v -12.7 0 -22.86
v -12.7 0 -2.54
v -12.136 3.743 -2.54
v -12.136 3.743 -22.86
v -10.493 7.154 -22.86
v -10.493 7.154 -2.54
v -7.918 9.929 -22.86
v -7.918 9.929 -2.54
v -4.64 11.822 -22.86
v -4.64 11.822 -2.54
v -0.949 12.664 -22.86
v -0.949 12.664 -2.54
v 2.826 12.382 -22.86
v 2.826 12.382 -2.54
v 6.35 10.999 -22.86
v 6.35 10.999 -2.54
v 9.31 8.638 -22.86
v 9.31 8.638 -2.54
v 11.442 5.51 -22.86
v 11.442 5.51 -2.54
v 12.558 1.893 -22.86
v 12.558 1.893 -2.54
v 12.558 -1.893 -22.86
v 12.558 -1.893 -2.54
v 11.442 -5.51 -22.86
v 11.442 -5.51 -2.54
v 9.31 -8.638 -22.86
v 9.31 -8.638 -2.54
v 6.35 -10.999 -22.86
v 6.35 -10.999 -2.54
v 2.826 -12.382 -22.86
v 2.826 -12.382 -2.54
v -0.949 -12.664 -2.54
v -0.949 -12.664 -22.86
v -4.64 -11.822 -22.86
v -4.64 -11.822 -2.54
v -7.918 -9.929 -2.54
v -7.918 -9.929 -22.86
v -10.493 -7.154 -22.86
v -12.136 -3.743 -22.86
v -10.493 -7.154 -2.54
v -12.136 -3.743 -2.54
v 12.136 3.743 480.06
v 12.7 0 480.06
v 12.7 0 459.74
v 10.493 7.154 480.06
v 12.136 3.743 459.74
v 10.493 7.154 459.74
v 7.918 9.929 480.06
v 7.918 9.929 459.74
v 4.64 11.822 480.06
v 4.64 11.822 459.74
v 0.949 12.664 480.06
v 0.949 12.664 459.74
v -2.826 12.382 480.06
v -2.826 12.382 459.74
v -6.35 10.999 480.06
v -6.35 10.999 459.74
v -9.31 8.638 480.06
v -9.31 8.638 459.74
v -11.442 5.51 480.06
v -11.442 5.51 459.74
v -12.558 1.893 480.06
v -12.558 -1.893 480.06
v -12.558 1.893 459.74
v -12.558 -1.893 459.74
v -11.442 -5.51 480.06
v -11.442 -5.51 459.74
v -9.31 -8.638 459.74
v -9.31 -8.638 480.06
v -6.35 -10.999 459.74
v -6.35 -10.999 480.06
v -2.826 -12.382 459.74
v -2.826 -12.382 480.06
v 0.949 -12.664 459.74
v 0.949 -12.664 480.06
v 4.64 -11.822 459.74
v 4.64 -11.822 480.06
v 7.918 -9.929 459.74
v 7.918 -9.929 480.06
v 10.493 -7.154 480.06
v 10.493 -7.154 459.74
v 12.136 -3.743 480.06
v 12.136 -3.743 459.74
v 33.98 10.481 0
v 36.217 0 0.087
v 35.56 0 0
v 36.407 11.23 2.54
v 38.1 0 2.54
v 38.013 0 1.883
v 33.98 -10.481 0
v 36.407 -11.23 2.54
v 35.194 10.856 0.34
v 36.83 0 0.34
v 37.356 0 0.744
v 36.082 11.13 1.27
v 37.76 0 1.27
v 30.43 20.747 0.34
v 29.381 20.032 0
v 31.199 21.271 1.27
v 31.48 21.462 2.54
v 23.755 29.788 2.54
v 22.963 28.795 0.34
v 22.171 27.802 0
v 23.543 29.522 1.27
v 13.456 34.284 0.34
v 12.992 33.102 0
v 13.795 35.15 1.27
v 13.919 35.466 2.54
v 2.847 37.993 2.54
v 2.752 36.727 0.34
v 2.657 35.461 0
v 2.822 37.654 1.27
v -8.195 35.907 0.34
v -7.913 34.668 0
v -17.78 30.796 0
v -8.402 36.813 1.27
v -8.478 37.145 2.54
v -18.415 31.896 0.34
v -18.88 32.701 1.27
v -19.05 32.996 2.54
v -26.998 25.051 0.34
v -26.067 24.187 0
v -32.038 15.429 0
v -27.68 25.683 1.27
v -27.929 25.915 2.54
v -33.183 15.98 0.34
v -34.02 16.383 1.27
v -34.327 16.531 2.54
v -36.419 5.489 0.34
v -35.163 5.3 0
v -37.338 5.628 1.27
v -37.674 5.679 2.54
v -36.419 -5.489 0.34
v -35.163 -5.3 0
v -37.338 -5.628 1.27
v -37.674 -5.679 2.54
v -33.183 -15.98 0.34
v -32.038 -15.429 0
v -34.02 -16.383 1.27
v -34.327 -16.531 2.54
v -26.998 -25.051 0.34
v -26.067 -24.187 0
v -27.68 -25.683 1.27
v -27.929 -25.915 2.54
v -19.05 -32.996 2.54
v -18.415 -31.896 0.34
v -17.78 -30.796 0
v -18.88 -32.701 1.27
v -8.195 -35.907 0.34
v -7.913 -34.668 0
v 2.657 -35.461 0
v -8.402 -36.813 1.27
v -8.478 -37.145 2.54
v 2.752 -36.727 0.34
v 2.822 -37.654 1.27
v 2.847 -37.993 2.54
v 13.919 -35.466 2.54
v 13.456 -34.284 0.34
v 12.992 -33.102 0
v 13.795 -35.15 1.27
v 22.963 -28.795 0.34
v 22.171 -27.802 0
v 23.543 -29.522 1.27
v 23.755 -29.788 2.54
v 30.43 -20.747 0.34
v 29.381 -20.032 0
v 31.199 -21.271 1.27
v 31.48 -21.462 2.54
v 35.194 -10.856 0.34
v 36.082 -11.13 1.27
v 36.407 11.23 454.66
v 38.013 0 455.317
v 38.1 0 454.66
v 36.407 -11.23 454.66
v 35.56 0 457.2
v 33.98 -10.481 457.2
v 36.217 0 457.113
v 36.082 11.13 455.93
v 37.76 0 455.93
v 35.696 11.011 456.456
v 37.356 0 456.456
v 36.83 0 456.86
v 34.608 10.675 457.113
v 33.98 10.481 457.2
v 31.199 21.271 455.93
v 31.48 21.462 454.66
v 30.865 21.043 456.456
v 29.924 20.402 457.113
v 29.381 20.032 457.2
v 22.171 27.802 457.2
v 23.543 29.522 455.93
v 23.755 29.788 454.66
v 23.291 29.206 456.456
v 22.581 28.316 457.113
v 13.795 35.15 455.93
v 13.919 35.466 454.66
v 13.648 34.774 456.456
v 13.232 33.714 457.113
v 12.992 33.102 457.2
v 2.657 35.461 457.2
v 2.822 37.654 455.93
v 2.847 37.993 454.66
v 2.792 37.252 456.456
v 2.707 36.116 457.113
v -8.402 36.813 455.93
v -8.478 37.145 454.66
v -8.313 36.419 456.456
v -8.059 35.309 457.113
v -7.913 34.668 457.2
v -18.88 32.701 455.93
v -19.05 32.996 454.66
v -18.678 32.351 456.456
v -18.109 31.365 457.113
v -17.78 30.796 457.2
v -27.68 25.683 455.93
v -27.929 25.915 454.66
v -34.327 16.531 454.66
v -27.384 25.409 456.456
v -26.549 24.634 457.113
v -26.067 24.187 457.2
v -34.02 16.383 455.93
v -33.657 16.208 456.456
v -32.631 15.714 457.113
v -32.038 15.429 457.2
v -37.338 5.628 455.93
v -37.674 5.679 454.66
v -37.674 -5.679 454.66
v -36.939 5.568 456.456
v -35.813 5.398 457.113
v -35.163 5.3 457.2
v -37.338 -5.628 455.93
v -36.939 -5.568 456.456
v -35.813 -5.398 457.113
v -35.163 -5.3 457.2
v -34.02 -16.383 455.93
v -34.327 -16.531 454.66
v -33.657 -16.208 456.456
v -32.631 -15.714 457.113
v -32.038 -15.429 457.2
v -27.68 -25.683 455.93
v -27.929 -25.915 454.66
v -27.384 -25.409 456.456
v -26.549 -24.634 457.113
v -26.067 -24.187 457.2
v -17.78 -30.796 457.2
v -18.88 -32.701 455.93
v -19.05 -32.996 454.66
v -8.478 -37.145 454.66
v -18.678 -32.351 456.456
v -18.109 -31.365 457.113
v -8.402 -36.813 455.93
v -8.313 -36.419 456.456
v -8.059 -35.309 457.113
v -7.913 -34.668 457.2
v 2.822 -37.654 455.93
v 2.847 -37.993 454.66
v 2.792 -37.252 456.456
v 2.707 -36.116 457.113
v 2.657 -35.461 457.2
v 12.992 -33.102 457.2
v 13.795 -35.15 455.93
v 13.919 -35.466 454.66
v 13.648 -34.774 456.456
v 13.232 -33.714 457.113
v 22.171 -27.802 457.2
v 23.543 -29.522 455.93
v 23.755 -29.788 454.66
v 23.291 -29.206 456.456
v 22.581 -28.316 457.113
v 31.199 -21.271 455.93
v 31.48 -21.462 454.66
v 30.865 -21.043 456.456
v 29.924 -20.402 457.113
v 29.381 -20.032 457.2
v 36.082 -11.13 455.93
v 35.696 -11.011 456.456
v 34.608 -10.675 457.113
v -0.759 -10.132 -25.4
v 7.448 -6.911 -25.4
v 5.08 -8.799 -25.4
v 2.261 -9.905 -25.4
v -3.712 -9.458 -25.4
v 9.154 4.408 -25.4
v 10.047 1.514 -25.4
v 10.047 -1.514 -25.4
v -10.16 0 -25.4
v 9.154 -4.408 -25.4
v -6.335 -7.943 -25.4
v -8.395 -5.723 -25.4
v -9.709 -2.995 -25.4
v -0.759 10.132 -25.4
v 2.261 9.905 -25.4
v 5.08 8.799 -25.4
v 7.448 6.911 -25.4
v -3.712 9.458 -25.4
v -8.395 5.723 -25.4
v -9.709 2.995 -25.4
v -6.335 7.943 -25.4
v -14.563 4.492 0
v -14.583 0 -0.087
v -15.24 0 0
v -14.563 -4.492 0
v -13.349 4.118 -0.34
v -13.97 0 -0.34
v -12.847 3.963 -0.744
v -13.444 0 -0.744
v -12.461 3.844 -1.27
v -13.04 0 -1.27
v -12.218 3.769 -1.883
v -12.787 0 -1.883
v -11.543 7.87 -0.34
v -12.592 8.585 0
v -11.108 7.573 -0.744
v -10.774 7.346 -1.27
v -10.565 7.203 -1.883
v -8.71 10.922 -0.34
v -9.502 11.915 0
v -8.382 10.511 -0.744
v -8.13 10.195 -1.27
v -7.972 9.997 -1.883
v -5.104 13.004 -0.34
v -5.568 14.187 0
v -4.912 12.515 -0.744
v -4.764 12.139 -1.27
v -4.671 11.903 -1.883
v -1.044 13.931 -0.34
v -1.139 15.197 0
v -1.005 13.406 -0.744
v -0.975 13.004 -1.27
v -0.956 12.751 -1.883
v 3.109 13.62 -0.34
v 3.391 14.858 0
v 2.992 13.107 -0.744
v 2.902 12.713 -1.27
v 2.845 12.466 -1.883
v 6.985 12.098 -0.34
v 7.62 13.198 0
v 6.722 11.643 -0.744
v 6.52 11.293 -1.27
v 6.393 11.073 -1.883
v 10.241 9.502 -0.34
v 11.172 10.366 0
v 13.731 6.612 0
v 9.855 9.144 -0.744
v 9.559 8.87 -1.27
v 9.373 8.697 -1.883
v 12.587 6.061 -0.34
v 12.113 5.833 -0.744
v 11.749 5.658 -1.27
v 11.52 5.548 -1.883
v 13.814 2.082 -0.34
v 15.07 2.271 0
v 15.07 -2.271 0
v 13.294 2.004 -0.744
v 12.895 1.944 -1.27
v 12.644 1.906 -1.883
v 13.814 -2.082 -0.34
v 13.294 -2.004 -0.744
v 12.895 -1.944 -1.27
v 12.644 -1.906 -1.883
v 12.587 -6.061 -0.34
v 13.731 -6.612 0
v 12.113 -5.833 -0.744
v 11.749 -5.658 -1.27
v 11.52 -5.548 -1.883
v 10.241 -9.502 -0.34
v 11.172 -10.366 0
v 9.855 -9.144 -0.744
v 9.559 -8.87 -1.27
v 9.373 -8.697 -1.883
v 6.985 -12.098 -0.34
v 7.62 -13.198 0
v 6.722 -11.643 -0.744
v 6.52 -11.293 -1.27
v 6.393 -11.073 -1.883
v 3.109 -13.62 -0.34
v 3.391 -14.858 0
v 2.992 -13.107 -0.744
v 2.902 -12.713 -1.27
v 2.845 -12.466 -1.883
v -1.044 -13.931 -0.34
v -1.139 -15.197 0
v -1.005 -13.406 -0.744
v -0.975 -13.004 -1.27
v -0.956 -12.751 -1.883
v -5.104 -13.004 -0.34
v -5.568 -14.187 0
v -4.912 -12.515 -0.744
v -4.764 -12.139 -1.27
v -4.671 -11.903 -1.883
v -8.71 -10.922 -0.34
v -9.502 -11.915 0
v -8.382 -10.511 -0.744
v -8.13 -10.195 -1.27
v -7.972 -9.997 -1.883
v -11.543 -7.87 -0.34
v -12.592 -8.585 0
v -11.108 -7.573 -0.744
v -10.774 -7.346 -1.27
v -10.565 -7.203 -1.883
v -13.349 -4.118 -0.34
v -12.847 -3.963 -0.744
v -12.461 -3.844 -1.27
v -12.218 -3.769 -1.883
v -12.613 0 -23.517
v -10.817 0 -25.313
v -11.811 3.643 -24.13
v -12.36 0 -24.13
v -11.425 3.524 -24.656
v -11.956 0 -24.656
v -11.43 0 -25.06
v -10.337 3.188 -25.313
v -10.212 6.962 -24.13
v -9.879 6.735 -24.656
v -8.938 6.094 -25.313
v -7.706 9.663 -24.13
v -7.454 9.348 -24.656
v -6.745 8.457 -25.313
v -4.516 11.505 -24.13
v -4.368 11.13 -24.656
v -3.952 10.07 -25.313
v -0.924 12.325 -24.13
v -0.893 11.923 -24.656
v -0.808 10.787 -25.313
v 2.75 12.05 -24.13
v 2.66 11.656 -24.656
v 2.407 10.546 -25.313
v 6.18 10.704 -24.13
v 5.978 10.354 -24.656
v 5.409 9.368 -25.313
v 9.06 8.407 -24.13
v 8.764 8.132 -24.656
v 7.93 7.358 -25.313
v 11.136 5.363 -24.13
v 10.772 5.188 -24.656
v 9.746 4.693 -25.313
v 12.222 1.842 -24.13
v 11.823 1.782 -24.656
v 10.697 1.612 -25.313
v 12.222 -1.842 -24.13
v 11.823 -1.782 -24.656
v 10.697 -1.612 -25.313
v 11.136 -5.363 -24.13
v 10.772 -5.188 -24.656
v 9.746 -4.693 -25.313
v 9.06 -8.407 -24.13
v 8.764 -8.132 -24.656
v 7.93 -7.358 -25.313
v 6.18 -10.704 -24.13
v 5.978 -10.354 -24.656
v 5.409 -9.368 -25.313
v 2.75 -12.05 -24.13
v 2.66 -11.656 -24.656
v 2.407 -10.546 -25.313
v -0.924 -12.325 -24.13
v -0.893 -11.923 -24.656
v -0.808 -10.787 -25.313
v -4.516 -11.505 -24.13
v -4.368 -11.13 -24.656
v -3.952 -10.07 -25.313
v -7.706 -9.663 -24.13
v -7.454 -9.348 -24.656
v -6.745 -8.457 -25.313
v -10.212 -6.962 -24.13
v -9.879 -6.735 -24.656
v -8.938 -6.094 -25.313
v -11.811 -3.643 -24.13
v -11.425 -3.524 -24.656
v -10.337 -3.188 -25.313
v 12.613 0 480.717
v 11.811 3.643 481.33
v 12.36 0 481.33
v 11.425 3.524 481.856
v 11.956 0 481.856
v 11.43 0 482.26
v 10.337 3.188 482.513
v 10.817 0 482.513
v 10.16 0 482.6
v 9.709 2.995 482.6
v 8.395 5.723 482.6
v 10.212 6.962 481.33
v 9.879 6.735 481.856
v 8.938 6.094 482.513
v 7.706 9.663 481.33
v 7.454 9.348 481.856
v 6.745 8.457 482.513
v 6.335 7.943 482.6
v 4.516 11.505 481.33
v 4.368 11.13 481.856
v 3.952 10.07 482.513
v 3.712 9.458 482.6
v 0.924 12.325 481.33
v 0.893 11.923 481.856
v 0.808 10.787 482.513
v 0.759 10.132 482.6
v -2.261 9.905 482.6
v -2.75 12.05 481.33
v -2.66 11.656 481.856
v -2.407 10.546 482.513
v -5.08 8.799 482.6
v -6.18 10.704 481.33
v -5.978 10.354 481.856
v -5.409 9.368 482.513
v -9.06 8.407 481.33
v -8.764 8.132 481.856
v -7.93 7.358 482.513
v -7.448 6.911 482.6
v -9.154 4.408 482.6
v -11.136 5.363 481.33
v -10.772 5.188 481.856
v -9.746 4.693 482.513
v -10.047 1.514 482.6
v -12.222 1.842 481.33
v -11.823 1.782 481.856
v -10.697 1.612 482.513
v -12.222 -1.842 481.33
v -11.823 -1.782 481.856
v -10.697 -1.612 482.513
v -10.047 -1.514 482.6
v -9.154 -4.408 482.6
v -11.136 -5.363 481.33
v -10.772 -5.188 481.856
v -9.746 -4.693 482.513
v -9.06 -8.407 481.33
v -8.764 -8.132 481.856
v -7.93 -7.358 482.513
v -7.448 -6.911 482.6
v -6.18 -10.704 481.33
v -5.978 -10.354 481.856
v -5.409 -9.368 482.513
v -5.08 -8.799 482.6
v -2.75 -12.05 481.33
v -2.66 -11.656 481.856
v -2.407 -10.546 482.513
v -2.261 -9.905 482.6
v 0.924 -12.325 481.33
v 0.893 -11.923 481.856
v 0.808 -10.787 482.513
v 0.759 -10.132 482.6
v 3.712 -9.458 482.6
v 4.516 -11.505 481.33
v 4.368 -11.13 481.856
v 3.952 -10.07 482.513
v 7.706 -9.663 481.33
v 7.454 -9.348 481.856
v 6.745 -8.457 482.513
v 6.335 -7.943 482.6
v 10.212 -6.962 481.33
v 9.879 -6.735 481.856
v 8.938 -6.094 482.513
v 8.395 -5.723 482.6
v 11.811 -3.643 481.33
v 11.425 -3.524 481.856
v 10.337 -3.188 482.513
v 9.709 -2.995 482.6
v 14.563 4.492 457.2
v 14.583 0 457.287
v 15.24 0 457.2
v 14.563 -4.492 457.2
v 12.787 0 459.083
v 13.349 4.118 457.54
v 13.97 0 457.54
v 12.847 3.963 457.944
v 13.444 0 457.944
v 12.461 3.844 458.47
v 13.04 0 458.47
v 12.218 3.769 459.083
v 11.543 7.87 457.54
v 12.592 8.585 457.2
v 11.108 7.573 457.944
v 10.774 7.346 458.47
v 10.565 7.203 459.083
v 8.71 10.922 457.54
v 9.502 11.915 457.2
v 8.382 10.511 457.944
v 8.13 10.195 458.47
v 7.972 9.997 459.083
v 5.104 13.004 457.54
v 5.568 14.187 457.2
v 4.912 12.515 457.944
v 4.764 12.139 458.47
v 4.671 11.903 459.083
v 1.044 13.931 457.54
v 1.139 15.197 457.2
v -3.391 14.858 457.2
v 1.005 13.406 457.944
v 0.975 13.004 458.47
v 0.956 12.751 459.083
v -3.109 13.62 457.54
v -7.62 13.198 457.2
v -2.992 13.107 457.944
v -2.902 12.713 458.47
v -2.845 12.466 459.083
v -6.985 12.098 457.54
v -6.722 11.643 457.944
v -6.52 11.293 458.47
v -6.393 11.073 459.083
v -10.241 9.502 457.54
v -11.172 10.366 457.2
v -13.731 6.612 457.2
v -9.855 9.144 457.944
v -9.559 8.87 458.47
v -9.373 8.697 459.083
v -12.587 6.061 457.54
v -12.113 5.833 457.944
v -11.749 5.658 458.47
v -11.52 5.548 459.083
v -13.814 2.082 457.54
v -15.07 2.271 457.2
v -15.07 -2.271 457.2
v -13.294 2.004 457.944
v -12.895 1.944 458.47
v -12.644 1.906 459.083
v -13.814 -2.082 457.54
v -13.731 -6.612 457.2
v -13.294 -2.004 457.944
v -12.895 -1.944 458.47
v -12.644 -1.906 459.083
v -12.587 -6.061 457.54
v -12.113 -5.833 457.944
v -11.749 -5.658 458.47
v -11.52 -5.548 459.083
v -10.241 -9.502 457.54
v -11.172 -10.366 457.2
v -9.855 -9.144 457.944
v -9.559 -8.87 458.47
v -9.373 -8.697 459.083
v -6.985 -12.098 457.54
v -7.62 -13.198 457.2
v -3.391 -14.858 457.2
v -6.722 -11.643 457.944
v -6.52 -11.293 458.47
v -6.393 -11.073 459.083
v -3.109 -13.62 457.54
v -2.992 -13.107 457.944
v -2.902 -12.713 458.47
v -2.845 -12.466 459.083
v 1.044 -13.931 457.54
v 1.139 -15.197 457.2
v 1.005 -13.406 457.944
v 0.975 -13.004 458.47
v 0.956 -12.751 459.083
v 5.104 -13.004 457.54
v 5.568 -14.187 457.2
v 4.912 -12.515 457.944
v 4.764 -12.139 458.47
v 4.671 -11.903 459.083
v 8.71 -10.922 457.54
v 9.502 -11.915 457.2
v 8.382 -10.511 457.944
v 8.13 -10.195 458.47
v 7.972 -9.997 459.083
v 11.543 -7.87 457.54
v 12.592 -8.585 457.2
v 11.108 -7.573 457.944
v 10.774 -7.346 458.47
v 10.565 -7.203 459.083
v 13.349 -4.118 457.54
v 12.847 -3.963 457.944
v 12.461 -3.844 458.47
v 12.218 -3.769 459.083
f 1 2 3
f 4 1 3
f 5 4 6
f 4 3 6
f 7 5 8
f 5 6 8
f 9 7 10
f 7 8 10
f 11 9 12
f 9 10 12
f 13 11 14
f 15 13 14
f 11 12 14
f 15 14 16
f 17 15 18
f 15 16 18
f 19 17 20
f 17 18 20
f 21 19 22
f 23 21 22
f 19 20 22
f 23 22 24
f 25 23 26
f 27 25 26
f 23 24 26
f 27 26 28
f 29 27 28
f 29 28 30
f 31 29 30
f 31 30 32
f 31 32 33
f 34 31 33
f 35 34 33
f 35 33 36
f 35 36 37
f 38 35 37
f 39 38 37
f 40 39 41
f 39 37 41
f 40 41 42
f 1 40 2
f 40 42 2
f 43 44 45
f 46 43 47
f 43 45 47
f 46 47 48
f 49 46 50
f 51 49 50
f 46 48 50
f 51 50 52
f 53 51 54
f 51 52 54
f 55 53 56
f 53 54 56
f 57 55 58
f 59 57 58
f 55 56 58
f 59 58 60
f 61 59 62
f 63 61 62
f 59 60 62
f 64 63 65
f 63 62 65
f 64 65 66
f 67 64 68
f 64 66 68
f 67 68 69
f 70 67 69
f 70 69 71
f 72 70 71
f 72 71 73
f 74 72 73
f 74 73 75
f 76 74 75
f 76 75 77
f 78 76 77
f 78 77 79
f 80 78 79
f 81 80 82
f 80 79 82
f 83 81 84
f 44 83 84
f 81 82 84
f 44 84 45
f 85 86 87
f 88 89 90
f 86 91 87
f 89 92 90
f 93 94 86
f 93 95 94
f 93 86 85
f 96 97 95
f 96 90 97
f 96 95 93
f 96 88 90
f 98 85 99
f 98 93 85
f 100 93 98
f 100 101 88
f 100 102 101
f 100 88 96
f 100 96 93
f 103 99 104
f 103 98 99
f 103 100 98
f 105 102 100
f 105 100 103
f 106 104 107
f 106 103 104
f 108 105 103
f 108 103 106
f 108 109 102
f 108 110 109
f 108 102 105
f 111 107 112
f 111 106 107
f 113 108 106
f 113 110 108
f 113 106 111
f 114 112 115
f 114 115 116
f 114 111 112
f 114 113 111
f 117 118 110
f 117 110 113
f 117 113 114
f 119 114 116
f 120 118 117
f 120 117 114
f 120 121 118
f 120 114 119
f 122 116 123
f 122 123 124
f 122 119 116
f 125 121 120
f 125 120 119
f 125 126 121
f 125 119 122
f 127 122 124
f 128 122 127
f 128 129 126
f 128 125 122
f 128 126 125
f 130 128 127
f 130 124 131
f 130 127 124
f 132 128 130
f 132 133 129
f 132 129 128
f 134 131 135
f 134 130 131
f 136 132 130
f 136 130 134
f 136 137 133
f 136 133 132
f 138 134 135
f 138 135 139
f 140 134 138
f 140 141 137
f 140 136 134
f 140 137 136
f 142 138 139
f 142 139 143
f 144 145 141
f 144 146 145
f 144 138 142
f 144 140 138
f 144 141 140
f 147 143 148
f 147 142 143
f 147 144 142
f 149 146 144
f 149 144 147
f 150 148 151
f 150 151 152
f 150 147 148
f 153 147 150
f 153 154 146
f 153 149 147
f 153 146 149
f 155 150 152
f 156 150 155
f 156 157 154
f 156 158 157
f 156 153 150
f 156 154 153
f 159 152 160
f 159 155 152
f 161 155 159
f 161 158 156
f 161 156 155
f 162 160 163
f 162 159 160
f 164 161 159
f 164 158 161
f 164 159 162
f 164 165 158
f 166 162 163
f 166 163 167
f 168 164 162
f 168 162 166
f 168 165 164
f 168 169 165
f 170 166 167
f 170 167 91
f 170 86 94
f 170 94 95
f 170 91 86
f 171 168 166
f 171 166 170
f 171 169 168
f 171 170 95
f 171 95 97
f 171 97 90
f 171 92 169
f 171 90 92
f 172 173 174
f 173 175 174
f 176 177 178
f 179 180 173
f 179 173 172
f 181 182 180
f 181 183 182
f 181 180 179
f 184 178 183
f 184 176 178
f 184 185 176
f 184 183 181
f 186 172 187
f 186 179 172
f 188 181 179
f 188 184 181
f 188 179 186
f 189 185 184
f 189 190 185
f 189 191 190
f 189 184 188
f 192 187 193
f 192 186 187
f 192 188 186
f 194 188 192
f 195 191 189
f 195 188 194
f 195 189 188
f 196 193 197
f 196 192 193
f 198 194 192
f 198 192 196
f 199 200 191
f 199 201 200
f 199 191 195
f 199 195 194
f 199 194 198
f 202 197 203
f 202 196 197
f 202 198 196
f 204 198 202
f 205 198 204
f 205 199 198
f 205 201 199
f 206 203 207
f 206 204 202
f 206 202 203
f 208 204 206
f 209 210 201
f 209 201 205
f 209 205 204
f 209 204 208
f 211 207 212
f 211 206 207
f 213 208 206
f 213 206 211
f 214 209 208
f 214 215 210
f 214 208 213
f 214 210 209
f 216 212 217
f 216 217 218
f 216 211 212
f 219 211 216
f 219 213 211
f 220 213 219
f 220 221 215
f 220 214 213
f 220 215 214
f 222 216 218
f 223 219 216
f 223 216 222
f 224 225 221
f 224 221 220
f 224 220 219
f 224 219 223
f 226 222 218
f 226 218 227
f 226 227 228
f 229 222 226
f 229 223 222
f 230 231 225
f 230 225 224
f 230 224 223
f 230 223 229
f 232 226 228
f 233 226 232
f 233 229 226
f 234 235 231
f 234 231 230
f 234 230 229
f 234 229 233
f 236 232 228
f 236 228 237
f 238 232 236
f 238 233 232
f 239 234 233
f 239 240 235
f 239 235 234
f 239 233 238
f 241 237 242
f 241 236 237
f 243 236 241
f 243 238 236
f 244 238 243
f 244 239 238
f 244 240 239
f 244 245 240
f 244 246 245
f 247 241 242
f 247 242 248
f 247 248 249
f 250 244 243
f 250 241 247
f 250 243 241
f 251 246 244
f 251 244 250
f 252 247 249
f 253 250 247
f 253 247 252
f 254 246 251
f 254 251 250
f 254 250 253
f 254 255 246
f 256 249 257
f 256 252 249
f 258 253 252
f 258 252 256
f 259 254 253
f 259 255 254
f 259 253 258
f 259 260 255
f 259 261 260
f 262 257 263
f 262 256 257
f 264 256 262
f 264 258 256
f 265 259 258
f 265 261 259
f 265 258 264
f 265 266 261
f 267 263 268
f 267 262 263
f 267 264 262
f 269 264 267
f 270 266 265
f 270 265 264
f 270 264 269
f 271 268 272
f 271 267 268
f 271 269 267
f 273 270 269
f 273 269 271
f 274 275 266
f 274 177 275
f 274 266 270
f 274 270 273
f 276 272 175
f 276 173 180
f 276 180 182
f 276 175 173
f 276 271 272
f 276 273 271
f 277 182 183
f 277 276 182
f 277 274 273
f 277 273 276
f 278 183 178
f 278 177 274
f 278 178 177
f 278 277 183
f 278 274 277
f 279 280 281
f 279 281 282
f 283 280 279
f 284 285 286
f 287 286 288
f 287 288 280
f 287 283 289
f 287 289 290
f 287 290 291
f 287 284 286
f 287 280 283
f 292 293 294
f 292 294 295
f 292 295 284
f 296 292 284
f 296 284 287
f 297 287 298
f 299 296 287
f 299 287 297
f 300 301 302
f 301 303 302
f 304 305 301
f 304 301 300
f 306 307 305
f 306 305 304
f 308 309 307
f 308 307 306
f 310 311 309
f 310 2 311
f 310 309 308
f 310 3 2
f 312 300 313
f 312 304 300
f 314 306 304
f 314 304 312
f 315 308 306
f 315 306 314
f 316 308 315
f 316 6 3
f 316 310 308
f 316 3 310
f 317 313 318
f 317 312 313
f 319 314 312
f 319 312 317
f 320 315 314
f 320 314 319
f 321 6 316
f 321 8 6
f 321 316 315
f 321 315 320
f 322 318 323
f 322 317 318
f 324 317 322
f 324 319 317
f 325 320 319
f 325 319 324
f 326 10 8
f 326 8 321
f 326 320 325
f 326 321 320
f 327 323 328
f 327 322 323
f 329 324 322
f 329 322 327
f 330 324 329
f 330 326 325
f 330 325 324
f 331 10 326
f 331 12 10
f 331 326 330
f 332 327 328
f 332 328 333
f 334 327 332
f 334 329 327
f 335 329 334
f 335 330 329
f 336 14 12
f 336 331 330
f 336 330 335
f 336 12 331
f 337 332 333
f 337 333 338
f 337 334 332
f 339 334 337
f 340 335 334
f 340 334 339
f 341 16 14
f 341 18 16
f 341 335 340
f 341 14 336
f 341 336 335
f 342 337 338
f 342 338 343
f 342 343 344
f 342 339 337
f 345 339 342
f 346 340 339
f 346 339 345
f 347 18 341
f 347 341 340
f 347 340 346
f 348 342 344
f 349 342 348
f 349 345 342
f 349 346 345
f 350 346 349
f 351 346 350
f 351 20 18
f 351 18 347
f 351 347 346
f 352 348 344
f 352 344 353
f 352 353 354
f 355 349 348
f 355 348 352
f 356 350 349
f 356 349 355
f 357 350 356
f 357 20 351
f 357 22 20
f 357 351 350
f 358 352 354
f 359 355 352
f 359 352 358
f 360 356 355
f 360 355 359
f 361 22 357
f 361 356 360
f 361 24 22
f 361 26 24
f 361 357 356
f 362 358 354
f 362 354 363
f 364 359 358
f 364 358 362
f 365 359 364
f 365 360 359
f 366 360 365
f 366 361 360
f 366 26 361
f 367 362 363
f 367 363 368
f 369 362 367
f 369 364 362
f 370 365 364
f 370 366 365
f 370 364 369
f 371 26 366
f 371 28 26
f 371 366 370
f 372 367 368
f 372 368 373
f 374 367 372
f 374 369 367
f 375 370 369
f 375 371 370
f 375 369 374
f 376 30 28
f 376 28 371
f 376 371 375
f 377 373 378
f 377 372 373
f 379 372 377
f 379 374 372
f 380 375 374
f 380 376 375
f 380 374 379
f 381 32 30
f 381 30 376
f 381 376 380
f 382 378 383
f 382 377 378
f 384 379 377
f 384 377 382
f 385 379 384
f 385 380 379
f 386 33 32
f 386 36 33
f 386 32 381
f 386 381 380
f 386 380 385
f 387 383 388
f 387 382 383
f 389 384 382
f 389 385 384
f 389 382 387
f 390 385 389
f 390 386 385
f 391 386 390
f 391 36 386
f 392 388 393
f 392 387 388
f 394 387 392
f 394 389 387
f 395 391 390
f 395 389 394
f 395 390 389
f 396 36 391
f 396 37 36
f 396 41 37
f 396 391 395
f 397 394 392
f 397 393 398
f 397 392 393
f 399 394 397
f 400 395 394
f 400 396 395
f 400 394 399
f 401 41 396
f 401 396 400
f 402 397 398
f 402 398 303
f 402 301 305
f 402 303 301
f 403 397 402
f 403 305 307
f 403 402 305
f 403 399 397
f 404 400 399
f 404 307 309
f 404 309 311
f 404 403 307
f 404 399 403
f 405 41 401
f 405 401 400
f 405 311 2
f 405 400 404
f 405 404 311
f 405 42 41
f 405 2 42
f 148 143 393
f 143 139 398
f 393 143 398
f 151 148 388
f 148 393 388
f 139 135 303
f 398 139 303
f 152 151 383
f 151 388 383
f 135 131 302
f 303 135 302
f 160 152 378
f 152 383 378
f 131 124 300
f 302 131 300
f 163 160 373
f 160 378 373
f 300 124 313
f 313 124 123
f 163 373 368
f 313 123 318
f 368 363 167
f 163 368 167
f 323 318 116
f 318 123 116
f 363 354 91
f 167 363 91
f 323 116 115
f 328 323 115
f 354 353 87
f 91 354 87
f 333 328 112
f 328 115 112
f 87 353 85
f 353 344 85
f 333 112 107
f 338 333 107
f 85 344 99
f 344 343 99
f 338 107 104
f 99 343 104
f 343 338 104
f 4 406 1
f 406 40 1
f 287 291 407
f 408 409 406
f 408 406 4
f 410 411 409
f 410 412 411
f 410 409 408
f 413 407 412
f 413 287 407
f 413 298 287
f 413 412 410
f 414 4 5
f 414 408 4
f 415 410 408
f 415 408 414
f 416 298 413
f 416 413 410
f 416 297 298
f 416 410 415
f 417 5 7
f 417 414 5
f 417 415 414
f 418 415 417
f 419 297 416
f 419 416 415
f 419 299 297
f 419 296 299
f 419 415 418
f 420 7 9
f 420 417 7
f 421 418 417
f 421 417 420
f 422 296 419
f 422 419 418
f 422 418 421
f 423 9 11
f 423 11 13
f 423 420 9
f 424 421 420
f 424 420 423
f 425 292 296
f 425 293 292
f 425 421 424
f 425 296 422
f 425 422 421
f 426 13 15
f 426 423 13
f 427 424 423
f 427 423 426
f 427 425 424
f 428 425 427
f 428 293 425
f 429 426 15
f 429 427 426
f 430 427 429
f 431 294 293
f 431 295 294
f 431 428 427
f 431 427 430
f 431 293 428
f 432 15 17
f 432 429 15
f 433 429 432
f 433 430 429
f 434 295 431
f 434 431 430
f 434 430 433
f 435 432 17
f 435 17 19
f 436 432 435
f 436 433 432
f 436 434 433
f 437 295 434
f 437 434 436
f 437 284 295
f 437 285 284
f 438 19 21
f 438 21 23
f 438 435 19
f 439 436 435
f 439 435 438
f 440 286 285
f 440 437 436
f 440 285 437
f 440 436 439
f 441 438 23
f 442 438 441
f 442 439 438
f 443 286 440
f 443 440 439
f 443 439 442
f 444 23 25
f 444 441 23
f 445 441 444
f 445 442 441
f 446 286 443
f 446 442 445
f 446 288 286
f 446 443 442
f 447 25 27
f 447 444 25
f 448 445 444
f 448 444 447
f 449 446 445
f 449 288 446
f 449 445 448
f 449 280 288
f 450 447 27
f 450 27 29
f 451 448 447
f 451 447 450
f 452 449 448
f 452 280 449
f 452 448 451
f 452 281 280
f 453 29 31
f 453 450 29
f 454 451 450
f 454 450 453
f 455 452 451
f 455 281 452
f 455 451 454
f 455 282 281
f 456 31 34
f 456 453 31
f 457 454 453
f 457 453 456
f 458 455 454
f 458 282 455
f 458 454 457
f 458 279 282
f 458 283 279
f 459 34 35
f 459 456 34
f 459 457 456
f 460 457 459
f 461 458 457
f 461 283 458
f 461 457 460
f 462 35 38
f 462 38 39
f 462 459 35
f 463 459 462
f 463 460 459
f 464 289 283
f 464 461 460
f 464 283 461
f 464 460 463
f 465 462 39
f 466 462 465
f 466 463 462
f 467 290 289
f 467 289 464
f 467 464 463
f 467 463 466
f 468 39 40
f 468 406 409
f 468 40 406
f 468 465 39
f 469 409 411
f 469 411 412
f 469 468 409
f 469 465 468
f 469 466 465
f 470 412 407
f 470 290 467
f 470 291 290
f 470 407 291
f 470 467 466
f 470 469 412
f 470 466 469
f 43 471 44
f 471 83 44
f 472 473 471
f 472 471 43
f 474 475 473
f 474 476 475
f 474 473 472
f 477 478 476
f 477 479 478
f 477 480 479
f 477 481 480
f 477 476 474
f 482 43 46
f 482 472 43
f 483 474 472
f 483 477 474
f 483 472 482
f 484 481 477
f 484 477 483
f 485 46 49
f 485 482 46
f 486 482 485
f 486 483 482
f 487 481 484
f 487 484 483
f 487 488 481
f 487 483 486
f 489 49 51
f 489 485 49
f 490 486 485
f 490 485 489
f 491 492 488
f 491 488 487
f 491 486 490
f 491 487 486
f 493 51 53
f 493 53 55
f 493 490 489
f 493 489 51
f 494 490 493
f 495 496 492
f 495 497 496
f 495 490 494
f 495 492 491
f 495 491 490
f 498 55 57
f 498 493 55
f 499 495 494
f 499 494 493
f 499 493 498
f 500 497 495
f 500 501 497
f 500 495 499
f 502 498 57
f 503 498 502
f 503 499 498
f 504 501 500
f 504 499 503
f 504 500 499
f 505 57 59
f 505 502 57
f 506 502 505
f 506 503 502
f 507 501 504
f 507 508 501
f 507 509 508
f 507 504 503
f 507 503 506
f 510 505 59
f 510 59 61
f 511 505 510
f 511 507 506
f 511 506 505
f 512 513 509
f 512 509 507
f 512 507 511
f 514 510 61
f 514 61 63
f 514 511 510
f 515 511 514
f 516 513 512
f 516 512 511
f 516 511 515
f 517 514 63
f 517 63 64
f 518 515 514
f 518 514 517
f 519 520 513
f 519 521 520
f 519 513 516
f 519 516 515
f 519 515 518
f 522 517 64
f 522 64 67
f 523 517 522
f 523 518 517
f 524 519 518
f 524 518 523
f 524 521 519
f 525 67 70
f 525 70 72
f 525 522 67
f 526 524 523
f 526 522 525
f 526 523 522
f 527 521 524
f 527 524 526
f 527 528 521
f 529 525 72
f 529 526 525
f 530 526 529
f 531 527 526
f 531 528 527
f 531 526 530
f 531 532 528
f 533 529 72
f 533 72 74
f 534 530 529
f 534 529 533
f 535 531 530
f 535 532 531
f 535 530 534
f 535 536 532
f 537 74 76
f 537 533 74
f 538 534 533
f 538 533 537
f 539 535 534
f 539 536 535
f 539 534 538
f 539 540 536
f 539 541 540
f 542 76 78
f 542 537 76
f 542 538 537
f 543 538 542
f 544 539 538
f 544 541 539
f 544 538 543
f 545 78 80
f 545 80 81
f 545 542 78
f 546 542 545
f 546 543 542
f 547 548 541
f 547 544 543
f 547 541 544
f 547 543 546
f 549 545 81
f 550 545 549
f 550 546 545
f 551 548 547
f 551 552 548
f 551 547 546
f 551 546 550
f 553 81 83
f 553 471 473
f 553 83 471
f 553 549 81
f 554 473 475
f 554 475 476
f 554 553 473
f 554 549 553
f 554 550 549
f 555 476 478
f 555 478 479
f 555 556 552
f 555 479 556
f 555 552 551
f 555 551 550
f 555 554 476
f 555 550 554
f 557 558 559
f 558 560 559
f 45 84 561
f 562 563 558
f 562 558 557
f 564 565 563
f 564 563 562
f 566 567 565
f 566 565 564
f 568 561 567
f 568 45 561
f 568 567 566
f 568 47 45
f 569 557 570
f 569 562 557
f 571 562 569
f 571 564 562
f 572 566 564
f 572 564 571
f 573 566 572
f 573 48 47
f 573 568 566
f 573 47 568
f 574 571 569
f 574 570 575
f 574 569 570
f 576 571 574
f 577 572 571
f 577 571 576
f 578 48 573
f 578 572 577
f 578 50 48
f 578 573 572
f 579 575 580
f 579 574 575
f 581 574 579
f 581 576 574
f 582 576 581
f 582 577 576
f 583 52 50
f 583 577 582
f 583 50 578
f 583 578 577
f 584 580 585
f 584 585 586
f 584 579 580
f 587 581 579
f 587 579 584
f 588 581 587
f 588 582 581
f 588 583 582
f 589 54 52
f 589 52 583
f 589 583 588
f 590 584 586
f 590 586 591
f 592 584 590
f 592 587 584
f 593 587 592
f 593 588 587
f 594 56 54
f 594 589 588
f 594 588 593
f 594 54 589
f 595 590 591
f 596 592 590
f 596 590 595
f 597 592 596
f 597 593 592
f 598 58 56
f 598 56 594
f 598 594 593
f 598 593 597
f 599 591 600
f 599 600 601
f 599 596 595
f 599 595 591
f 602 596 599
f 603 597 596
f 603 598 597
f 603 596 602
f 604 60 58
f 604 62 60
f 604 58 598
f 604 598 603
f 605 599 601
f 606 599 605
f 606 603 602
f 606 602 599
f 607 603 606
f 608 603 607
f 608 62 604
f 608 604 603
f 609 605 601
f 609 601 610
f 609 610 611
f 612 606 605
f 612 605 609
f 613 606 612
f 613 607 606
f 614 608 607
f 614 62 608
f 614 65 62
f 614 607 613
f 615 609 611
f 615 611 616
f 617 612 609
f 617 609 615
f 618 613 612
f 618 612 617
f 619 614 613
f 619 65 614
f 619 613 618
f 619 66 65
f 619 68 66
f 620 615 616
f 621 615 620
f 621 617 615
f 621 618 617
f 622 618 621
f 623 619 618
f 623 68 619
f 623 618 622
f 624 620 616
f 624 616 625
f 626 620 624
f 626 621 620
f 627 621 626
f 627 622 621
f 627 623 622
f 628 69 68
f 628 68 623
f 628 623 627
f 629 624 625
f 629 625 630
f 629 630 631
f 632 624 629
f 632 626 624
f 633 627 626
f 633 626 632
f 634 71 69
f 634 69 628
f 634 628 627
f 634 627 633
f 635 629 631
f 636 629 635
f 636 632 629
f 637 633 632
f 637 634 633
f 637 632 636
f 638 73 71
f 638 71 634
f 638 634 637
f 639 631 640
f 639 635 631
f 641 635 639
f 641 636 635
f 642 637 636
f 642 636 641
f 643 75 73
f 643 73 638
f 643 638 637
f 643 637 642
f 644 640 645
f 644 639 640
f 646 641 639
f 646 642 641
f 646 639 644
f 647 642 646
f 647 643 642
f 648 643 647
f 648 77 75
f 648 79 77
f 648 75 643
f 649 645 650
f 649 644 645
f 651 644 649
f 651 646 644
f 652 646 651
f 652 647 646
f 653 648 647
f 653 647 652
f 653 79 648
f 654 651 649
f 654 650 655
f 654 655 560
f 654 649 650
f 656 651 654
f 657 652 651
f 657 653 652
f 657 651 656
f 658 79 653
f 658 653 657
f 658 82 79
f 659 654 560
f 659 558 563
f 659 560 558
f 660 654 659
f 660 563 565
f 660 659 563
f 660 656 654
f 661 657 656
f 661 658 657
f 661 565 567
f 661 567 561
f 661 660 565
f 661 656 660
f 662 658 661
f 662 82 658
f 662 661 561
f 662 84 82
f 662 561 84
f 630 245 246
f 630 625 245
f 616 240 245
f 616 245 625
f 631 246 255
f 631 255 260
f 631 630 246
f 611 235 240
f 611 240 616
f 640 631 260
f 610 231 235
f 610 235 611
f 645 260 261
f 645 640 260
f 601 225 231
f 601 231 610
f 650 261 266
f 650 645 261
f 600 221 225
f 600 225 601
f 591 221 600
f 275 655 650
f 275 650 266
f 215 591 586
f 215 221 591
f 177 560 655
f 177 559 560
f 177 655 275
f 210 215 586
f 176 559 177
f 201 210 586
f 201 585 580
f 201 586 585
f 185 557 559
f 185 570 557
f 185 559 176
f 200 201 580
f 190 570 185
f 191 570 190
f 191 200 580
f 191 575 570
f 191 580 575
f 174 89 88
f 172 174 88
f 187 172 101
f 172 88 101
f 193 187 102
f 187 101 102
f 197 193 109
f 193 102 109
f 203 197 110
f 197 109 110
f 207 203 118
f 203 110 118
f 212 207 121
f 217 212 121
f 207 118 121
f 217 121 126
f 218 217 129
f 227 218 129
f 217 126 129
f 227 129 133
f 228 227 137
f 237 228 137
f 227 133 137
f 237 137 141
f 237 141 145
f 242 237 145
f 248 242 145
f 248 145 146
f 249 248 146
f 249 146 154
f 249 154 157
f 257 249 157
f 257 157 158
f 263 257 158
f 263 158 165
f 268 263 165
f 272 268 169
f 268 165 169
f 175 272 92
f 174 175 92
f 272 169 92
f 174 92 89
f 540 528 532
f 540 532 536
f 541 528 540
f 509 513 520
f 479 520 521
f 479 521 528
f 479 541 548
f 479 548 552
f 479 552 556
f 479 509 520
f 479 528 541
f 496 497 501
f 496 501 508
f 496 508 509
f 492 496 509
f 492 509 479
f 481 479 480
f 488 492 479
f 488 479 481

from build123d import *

# Parameters (mm, degrees)
SKETCH1_R           = 38.1
BOSS_EXTRUDE1_DEPTH = 457.2
SKETCH2_R           = 12.7
BOSS_EXTRUDE2_DEPTH = 25.4
SKETCH3_R           = 12.7
BOSS_EXTRUDE3_DEPTH = 25.4
FILLET1_R           = 2.54
FILLET2_R           = 2.54


with BuildPart() as part:
    # Sketch1 → Boss-Extrude1 (new body)
    with BuildSketch(Plane.XY):
        Circle(SKETCH1_R)
    extrude(amount=BOSS_EXTRUDE1_DEPTH)

    # Sketch2 → Boss-Extrude2 (add)
    with BuildSketch(Plane(origin=(0, 0, 0), x_dir=(-1, 0, 0), z_dir=(0, 0, -1))):
        Circle(SKETCH2_R)
    extrude(amount=BOSS_EXTRUDE2_DEPTH)

    # Sketch3 → Boss-Extrude3 (add)
    with BuildSketch(Plane.XY.offset(457.2)):
        Circle(SKETCH3_R)
    extrude(amount=BOSS_EXTRUDE3_DEPTH)

    # Fillet1
    fillet1_edges = [part.edges().sort_by_distance(p)[0] for p in [
        (-12.7, 0, 457.2),
        (12.7, 0, 0),
    ]]
    fillet(fillet1_edges, radius=FILLET1_R)

    # Fillet2
    fillet2_edges = [part.edges().sort_by_distance(p)[0] for p in [
        (-12.7, 0, 482.6),
        (-38.1, 0, 0),
        (-38.1, 0, 457.2),
        (12.7, 0, -25.4),
    ]]
    fillet(fillet2_edges, radius=FILLET2_R)


solid = part.part
